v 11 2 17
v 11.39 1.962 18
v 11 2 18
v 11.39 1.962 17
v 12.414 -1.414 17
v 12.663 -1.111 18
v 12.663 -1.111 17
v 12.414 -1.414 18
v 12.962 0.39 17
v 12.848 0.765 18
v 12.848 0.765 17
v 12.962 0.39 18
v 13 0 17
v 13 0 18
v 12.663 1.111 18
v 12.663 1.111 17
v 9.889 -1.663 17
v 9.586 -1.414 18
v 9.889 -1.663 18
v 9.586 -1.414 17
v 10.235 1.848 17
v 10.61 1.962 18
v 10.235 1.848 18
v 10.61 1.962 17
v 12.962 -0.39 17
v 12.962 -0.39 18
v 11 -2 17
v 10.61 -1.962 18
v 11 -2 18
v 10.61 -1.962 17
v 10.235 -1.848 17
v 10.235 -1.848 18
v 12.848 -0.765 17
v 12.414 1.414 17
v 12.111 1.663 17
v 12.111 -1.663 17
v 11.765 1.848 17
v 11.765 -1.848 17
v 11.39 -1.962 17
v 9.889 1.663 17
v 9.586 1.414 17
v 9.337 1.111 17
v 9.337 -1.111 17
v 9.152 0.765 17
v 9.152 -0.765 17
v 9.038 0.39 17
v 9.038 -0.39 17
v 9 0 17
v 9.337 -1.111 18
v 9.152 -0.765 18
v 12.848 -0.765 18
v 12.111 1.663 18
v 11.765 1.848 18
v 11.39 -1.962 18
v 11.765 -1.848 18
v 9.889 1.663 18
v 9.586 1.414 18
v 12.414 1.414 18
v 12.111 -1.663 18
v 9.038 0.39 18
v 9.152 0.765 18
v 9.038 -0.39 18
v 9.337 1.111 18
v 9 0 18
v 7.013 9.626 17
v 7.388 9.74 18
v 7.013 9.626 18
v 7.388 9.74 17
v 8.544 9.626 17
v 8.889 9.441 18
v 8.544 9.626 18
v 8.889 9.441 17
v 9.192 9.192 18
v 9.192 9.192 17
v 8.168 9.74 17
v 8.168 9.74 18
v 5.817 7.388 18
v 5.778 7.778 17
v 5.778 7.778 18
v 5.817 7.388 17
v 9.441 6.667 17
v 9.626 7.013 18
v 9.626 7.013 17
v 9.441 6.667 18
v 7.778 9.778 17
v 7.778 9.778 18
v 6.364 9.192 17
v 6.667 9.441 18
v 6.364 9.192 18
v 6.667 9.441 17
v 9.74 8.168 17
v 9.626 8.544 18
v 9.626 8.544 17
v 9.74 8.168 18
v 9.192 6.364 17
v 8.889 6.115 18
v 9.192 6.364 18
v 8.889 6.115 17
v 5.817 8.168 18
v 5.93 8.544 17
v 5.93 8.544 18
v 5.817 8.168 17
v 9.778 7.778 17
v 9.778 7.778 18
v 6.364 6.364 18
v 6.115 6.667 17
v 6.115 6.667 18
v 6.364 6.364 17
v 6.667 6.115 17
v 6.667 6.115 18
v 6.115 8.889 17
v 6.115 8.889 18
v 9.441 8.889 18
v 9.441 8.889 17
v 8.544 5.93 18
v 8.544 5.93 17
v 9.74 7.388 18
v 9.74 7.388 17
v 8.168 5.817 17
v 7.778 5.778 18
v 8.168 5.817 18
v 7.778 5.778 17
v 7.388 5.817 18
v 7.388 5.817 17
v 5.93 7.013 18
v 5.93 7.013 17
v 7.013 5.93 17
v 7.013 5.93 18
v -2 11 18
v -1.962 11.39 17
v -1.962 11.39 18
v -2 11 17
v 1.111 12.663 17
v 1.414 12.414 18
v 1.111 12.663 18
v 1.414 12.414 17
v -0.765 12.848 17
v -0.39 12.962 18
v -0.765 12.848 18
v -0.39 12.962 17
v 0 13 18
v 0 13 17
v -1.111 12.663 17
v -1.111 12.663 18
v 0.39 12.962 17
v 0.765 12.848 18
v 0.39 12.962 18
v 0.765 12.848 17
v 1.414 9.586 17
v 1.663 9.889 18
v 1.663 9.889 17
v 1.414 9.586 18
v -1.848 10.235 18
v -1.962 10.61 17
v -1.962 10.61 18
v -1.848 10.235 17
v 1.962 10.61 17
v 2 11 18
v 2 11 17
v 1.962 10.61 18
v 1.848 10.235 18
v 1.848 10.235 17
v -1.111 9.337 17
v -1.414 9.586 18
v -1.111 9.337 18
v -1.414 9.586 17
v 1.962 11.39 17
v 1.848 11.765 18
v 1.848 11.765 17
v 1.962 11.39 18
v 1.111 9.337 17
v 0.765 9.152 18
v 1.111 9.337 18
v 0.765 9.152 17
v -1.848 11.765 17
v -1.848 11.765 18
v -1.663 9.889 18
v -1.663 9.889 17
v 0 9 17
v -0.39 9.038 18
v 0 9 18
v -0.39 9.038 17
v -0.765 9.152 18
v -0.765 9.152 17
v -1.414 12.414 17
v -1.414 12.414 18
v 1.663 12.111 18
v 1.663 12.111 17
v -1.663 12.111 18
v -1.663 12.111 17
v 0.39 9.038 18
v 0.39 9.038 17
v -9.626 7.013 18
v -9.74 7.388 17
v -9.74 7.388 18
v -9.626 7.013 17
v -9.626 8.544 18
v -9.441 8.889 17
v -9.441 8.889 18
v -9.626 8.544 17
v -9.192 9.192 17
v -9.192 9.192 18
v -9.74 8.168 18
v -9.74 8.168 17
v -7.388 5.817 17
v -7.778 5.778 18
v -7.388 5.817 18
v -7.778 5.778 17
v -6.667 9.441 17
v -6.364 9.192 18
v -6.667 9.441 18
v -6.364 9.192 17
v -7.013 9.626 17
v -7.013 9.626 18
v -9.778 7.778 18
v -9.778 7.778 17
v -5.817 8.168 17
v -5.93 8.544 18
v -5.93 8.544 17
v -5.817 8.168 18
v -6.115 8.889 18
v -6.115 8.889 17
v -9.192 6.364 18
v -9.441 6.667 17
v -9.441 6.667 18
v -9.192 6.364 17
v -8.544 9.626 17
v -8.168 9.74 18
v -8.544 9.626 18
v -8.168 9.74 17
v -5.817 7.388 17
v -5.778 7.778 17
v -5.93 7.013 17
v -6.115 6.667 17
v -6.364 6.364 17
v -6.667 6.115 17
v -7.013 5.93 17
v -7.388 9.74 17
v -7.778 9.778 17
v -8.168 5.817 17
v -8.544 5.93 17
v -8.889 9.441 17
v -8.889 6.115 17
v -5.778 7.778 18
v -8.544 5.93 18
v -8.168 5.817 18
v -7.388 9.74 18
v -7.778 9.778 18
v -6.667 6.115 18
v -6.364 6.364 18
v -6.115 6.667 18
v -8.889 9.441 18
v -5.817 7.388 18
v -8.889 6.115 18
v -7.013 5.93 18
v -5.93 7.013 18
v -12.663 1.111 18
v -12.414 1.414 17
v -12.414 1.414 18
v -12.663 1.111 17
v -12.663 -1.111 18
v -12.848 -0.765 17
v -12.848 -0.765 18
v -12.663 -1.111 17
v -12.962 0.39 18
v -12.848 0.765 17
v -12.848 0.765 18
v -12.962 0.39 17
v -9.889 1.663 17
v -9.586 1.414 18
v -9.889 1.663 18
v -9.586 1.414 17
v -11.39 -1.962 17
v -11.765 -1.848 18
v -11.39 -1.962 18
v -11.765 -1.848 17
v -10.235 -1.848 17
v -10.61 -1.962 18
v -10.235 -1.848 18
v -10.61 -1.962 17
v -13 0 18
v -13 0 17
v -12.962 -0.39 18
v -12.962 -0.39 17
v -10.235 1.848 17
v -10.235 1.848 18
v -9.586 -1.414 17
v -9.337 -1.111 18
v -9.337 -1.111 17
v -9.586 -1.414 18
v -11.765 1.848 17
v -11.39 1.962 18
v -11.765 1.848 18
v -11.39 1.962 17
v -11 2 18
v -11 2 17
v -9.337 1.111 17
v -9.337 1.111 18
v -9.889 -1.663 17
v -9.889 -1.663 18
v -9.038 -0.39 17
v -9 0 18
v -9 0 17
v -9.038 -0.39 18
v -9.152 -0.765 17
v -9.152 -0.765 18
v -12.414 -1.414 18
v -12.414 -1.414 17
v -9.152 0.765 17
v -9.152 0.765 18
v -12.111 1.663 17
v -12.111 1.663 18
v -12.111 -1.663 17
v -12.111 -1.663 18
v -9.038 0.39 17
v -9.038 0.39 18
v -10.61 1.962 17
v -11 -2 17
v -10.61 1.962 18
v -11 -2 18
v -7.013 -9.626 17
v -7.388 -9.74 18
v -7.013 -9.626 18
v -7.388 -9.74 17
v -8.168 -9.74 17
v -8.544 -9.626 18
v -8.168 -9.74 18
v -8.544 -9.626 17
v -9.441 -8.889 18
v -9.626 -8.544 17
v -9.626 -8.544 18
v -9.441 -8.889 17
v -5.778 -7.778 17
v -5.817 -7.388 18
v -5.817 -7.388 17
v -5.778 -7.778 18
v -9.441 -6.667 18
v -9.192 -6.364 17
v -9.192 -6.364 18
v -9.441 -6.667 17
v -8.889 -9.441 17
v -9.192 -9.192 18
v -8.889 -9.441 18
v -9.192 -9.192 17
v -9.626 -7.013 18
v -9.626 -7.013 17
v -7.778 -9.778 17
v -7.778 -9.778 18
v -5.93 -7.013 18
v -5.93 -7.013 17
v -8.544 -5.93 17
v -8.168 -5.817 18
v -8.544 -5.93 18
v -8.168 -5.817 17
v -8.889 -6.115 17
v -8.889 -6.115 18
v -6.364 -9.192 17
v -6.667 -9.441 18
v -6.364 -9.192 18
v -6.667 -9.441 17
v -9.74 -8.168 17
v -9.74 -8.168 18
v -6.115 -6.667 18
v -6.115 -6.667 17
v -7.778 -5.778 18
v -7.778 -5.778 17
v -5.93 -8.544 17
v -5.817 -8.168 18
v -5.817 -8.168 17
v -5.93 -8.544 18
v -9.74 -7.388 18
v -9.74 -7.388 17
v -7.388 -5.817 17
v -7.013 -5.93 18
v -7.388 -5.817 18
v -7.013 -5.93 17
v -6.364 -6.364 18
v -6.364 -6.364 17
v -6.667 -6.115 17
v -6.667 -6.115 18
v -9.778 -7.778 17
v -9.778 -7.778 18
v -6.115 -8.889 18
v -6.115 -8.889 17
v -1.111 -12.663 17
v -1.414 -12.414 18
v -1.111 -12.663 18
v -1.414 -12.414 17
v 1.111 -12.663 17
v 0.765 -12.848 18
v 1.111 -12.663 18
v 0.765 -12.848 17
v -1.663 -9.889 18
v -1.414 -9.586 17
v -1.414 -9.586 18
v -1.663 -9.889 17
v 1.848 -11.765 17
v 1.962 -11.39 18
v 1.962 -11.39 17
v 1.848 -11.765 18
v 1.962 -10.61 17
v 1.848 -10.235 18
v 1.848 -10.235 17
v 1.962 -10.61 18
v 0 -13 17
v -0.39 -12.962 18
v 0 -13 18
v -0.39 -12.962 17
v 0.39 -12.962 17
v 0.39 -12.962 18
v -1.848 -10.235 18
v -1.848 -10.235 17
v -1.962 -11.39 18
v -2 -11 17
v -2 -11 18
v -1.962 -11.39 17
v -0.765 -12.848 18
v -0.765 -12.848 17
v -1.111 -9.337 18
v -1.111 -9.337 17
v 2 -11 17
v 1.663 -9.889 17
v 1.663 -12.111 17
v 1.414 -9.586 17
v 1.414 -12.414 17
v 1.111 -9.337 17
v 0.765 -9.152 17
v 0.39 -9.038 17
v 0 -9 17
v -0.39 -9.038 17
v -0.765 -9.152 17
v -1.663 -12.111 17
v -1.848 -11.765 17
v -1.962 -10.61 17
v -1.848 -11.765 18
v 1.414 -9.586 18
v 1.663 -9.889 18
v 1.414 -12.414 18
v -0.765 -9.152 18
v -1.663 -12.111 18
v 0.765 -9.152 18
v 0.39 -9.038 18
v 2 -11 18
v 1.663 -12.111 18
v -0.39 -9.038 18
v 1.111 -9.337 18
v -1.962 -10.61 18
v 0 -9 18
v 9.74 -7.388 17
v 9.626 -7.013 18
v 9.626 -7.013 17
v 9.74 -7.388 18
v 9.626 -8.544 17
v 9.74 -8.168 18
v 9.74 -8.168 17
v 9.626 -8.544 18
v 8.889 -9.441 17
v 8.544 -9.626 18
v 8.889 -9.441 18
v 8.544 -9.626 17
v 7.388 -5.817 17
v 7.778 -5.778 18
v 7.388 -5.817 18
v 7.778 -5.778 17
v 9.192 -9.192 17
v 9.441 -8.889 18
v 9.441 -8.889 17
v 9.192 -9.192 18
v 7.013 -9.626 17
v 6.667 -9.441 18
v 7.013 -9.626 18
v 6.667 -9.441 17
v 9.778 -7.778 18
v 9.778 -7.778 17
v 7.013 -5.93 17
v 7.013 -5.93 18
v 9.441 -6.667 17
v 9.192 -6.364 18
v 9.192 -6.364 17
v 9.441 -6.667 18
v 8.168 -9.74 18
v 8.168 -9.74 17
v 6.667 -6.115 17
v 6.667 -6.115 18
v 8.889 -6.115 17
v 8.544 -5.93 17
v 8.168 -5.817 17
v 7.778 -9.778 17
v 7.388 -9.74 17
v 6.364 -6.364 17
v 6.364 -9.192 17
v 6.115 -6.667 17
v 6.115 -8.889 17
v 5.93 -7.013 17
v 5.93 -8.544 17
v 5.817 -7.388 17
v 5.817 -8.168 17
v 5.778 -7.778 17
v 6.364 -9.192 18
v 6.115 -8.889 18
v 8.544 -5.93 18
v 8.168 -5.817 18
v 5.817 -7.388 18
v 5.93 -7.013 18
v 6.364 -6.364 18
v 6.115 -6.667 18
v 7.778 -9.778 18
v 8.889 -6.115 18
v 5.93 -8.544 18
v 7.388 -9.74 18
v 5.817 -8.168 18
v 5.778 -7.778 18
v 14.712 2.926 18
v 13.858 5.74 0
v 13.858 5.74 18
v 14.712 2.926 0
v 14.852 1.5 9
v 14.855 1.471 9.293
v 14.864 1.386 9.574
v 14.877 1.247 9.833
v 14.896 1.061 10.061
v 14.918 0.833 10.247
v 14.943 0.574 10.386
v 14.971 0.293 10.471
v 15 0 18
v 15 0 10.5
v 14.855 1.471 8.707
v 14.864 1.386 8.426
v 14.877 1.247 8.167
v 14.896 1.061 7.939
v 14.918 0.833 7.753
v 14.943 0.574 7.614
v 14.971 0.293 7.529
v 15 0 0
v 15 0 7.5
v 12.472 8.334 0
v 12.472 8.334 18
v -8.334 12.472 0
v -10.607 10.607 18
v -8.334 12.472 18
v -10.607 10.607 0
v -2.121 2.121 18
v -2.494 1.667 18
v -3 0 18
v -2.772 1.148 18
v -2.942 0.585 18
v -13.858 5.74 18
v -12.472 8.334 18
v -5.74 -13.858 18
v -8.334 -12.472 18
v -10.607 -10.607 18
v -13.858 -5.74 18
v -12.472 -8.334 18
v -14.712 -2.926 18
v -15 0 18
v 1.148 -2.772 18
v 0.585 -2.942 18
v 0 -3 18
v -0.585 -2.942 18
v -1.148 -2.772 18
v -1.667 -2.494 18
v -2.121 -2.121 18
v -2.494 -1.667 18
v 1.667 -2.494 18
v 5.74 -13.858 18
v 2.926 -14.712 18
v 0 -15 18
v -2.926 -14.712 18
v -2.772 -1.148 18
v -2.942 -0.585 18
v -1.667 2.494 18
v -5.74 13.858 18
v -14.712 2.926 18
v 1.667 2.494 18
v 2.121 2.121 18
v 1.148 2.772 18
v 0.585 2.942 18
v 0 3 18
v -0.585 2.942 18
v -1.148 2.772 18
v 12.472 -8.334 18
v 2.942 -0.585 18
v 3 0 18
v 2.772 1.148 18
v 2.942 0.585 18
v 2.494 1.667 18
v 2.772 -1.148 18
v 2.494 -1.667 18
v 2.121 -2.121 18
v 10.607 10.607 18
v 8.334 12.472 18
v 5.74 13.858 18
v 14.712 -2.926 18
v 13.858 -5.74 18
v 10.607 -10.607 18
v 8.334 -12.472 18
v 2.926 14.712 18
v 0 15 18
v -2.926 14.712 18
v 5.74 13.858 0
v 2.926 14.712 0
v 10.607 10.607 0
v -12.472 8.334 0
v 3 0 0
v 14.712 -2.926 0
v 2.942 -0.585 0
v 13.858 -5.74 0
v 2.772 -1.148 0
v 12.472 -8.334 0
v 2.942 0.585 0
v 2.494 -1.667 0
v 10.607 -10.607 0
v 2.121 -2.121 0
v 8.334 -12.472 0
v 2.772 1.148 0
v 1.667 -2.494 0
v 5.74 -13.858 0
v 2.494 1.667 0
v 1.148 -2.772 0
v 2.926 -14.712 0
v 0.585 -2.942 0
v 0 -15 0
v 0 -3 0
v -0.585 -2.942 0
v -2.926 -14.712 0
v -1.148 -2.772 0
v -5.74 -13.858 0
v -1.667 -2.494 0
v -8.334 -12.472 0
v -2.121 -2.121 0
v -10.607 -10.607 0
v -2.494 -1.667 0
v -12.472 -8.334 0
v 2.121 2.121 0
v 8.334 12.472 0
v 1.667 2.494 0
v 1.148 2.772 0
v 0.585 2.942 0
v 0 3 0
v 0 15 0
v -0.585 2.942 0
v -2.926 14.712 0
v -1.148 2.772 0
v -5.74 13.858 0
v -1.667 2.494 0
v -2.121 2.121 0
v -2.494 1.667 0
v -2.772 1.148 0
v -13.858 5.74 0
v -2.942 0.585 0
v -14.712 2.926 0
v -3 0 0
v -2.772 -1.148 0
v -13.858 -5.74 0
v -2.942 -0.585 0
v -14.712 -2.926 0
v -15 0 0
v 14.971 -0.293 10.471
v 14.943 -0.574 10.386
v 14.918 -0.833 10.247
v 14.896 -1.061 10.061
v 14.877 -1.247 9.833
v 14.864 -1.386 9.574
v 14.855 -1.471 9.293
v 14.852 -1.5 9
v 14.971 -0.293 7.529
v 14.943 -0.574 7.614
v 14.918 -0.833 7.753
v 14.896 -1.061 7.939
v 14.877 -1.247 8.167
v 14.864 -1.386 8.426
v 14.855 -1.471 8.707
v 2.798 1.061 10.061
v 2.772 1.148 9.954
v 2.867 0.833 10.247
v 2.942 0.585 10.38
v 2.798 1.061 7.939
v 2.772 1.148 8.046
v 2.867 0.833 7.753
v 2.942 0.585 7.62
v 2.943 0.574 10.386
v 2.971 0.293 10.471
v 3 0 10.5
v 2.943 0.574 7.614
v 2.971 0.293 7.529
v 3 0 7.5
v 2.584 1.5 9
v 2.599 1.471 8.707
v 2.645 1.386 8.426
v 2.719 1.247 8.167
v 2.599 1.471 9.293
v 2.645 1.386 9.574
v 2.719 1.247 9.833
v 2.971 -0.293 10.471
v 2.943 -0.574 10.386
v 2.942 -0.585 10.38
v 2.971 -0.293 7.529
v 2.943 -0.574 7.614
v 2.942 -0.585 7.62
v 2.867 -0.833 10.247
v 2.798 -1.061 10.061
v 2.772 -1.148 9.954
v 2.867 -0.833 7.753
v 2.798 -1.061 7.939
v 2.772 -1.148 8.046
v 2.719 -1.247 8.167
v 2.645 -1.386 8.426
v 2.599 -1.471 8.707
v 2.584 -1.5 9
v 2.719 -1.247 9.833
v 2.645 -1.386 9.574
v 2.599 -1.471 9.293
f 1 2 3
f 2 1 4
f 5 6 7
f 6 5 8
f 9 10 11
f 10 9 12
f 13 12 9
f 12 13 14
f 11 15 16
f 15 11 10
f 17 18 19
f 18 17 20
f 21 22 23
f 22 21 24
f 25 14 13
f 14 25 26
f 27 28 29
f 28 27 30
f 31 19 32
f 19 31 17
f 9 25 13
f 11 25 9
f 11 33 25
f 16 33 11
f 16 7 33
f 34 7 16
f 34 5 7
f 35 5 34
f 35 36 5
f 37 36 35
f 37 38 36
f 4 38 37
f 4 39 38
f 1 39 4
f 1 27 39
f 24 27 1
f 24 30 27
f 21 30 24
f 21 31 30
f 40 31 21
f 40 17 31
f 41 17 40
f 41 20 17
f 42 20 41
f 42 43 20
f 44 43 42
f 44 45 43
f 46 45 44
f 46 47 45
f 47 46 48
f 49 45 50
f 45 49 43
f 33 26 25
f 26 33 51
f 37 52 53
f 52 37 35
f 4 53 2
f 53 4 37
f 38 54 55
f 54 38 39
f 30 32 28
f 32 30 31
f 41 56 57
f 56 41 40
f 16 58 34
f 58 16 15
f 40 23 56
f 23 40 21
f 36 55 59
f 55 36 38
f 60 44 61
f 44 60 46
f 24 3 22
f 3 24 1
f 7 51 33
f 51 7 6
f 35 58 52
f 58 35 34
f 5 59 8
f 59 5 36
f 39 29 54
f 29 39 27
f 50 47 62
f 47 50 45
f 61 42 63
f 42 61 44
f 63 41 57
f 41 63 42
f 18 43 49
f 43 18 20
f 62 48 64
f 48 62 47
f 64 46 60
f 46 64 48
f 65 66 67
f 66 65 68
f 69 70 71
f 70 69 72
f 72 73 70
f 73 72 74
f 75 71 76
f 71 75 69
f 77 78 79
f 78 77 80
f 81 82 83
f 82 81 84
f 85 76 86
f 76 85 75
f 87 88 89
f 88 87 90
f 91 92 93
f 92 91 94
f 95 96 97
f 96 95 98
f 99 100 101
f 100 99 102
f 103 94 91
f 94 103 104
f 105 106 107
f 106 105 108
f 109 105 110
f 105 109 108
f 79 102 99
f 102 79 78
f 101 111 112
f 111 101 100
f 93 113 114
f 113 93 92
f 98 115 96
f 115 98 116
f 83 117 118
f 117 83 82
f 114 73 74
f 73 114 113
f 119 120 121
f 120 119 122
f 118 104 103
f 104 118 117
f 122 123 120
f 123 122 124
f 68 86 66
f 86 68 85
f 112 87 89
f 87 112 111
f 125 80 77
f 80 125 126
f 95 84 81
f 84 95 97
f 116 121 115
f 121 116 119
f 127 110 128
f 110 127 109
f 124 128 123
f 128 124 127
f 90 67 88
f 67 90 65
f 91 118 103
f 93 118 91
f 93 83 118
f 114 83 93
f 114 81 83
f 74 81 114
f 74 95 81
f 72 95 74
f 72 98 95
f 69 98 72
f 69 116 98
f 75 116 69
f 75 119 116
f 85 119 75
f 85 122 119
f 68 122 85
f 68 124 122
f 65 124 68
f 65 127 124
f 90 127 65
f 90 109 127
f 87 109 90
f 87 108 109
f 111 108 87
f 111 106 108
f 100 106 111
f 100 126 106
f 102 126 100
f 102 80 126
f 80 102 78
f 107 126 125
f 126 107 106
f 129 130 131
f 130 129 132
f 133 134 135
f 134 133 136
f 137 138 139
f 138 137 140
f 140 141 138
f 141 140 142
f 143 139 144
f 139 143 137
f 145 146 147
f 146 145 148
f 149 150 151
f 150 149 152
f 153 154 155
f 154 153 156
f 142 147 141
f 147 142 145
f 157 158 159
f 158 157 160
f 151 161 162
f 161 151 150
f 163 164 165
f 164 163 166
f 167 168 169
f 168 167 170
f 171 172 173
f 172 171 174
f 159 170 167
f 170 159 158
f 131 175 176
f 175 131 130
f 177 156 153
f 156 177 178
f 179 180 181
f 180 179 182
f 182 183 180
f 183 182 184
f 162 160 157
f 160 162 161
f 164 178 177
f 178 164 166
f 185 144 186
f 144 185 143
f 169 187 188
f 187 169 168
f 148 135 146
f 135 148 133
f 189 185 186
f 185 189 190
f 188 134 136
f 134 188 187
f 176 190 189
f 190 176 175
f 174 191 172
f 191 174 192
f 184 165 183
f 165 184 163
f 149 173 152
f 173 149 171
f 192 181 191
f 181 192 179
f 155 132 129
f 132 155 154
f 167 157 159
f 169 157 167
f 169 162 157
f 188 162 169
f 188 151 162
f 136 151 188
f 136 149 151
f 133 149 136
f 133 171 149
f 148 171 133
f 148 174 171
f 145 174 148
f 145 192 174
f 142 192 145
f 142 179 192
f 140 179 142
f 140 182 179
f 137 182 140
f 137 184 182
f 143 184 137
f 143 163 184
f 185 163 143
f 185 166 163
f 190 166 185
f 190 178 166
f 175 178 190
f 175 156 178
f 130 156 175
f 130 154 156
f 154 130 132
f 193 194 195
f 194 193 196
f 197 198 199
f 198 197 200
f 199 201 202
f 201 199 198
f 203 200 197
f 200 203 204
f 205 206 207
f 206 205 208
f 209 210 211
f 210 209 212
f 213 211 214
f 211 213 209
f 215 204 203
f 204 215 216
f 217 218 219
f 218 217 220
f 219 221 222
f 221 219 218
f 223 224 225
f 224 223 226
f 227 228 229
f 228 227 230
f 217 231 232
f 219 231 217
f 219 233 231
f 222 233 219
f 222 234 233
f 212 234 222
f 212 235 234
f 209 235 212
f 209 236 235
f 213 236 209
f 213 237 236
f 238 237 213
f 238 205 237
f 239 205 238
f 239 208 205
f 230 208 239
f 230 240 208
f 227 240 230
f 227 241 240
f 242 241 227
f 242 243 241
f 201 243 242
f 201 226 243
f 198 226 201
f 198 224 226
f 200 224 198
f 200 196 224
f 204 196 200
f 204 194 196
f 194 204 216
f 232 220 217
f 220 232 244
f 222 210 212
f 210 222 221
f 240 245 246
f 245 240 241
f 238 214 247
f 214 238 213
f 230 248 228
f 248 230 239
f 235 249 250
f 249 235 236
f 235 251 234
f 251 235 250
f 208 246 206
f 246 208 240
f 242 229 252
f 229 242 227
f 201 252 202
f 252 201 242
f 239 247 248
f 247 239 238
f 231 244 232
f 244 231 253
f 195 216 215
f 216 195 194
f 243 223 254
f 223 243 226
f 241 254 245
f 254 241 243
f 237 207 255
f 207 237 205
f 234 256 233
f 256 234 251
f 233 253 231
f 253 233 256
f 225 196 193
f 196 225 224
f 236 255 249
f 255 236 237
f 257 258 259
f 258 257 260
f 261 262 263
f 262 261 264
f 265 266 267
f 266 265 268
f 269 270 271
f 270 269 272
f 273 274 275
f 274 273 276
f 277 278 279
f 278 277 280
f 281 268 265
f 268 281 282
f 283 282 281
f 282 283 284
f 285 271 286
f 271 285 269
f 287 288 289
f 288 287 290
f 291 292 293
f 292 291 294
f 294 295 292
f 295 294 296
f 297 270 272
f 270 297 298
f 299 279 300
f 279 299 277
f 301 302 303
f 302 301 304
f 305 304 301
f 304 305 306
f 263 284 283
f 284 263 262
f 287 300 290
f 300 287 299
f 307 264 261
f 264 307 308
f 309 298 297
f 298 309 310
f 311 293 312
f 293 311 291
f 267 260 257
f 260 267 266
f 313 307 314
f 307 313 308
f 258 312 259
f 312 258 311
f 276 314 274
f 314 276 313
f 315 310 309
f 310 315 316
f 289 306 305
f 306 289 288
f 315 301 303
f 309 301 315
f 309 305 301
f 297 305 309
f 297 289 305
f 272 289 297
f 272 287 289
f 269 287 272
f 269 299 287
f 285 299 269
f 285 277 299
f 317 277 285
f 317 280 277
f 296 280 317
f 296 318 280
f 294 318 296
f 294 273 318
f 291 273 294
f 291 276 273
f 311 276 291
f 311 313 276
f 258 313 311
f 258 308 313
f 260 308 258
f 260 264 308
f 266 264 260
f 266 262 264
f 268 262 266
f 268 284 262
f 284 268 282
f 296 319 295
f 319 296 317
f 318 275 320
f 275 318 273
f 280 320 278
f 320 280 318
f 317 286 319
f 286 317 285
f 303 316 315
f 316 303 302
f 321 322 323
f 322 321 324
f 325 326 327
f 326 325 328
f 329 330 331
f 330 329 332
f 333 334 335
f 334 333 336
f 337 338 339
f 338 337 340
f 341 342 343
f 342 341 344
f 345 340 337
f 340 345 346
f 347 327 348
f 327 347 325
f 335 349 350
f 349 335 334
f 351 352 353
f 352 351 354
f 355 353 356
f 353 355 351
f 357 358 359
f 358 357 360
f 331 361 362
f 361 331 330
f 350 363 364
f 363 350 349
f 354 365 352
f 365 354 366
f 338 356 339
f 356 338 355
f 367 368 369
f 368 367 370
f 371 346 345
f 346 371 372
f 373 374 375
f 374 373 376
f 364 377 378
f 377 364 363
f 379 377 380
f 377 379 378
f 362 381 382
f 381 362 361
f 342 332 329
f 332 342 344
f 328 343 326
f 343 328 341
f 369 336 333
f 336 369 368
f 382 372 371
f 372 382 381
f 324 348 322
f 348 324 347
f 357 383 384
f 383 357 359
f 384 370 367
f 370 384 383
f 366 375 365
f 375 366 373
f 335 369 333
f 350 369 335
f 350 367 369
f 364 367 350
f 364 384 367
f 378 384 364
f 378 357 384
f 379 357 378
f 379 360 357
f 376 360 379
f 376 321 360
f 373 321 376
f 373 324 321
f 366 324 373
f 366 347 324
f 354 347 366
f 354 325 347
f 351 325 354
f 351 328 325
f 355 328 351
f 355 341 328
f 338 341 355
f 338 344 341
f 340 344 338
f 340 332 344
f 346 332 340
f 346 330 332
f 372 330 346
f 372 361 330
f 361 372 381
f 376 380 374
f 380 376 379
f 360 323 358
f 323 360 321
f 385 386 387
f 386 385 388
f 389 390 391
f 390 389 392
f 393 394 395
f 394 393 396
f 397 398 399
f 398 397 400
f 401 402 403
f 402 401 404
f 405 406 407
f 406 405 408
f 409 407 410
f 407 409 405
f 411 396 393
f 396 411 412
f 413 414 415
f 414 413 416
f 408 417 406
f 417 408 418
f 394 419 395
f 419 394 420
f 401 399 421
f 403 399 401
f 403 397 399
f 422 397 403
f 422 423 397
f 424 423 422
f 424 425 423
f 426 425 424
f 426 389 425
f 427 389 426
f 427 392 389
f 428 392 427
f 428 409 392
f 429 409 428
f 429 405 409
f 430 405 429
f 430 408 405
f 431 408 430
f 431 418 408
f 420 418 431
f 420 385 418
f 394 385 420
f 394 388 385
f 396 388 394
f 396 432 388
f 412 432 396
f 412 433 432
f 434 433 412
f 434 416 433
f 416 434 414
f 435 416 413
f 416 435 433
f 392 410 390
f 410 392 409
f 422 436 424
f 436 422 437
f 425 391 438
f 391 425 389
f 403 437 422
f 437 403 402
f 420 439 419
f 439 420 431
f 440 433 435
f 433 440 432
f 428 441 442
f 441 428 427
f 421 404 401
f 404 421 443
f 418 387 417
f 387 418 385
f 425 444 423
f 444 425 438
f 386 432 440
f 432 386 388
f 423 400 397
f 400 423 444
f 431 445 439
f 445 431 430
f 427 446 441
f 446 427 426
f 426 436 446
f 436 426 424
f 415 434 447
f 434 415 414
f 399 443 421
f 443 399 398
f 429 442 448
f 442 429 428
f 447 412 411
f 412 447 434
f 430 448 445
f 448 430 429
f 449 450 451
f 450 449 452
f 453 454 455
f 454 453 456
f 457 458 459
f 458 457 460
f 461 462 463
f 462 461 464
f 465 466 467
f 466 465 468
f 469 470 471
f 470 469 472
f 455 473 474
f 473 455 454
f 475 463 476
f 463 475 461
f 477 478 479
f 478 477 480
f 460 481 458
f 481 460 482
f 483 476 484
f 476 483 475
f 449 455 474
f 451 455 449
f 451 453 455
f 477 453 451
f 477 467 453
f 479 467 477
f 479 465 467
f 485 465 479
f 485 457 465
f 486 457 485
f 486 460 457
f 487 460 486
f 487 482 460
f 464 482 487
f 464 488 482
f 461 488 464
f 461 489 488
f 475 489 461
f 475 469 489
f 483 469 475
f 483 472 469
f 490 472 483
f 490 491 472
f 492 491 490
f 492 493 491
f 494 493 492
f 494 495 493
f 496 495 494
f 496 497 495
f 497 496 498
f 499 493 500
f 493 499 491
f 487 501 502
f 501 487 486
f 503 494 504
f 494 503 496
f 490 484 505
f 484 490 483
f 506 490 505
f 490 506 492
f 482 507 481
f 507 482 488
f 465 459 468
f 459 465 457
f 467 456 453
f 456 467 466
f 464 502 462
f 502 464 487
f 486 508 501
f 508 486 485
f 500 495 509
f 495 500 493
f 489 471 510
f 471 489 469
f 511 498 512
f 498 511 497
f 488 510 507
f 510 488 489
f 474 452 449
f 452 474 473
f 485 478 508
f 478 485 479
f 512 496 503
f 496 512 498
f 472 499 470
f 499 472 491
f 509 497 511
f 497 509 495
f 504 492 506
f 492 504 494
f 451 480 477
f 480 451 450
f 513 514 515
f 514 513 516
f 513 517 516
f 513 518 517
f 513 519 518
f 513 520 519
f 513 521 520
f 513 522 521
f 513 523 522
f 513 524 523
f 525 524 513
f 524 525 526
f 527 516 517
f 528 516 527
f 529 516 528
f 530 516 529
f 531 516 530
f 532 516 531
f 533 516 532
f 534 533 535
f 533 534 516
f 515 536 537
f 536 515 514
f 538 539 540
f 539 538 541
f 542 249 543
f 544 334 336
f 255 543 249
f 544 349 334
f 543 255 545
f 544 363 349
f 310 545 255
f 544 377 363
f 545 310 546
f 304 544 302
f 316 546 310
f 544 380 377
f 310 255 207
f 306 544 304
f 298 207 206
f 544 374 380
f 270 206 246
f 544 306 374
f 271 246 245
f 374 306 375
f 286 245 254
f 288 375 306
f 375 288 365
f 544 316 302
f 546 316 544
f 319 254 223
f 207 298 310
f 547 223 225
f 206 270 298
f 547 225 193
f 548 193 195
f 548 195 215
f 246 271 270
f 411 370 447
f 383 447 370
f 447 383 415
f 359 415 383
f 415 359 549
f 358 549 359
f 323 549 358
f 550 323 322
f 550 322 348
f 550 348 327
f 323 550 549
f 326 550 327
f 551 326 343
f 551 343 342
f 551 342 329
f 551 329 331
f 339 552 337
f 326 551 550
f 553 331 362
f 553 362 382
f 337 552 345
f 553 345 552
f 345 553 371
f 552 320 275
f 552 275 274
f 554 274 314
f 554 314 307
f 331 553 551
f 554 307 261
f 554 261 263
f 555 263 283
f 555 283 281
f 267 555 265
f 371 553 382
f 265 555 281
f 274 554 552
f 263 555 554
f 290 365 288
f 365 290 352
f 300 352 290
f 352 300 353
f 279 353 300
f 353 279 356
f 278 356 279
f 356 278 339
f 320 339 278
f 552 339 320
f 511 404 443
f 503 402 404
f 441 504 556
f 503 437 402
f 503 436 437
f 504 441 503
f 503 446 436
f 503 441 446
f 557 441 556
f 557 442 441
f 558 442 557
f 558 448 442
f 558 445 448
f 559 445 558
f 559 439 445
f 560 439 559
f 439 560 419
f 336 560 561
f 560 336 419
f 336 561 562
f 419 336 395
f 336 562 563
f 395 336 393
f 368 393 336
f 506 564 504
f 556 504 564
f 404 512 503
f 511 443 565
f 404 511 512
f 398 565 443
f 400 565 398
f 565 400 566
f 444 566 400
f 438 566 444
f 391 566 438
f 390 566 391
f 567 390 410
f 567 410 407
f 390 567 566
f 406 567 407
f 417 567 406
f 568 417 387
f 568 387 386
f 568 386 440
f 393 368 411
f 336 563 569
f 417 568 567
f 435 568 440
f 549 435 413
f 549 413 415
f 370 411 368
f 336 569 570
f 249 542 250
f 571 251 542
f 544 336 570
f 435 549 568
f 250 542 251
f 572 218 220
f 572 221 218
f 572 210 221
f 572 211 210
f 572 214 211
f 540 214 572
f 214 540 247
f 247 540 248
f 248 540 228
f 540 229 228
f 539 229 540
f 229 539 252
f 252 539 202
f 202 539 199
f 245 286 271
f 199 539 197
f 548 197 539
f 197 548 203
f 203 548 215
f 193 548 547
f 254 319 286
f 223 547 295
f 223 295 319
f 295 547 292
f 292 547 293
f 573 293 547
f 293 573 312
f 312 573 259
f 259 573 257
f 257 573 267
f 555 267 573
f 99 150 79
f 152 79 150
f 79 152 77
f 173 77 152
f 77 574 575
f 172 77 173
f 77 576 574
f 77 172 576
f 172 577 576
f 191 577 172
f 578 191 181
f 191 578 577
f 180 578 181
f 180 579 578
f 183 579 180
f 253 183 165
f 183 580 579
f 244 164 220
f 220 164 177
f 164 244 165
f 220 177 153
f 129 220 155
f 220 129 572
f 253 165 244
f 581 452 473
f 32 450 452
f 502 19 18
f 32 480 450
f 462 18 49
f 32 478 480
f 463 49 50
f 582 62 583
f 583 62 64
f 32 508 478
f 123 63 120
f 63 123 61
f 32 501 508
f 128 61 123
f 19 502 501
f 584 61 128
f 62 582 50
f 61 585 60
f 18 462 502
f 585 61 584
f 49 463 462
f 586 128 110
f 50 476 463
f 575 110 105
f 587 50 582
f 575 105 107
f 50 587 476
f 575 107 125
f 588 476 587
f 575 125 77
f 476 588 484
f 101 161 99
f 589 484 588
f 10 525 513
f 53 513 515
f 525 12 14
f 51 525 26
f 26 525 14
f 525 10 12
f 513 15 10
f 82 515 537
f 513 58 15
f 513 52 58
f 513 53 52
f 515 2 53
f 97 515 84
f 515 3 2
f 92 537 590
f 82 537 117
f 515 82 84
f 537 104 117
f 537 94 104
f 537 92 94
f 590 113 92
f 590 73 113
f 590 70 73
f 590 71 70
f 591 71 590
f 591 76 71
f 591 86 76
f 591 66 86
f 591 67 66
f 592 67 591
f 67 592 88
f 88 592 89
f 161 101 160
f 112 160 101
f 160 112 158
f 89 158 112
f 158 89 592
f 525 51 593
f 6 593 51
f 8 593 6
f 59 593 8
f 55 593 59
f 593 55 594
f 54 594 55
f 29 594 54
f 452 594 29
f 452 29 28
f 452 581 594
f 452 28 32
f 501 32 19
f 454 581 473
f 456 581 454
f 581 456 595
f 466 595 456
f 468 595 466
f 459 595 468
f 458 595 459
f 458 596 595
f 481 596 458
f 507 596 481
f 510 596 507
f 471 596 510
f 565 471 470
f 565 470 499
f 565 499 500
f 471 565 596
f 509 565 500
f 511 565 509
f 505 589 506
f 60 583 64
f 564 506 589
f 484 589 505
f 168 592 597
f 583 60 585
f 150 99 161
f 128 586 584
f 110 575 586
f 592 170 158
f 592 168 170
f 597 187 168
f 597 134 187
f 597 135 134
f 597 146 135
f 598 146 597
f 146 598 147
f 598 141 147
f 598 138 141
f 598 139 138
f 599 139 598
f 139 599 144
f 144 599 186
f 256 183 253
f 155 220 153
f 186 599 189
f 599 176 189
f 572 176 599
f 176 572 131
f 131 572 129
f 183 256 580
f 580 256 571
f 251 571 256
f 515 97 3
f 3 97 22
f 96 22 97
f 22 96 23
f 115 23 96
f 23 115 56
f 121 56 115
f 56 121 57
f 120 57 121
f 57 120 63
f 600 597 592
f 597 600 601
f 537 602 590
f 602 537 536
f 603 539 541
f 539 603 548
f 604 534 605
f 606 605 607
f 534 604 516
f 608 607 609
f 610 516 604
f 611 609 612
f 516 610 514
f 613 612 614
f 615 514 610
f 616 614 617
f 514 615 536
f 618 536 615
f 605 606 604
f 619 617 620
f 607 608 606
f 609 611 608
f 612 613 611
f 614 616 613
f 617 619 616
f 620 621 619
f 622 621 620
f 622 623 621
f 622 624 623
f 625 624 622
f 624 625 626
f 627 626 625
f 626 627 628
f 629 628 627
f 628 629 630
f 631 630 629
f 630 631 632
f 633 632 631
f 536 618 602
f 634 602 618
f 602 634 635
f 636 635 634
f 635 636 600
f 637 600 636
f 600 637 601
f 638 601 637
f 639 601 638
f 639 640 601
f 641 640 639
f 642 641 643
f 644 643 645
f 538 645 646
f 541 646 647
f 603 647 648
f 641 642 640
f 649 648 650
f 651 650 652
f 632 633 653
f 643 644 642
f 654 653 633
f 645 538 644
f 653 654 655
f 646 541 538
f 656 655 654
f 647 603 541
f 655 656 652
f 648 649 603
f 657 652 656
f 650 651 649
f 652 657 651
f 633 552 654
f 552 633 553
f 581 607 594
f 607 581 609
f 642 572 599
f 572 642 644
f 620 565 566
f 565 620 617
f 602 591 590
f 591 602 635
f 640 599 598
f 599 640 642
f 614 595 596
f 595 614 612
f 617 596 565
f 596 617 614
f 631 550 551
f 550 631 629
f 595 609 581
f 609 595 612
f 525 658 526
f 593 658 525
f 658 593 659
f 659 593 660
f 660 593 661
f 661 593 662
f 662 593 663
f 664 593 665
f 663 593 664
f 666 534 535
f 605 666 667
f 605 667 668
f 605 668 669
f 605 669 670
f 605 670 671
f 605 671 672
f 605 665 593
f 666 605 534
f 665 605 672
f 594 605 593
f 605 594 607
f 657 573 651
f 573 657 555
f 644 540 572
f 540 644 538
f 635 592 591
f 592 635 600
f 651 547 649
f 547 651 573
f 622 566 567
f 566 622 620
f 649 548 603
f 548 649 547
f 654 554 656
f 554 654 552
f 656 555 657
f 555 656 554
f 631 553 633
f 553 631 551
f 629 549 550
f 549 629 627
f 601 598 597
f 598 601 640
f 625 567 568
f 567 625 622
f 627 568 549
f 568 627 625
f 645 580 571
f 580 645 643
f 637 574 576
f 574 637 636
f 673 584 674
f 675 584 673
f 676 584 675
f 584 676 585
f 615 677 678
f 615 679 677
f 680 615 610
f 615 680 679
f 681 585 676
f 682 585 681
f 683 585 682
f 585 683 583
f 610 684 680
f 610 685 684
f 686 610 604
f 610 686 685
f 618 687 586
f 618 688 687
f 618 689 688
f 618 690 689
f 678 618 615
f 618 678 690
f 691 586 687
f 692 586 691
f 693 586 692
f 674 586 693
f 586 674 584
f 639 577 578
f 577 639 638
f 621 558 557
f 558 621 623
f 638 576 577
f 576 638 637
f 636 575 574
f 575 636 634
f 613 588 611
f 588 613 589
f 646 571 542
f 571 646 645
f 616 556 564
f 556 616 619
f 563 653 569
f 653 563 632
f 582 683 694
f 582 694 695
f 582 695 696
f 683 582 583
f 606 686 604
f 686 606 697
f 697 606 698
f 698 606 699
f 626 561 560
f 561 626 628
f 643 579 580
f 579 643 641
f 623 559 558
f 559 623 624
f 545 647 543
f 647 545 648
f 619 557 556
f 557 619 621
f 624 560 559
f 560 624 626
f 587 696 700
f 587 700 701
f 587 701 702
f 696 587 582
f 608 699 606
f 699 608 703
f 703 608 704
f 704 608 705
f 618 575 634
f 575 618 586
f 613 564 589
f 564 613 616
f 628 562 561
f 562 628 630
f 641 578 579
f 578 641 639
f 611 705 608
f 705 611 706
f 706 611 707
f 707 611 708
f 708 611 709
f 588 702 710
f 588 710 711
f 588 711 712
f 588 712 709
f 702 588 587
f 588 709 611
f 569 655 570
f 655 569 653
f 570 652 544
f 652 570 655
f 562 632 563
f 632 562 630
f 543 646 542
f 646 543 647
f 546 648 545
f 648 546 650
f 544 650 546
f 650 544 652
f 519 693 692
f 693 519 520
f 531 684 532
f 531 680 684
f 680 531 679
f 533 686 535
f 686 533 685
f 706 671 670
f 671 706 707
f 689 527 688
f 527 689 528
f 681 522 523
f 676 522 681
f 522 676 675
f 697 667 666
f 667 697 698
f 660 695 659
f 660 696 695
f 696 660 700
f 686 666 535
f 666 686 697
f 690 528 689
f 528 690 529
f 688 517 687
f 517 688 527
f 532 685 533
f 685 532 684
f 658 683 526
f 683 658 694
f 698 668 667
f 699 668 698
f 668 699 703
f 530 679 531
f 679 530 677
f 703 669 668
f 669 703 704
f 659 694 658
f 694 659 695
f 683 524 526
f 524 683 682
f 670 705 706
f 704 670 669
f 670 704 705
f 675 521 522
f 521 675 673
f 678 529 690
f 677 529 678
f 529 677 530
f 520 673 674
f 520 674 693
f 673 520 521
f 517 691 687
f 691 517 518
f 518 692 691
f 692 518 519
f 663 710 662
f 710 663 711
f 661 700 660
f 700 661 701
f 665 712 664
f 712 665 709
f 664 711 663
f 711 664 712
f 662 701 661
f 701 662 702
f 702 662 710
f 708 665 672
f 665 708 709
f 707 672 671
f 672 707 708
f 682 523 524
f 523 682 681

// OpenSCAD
$fn = 32;

// ----------------------------------------------------------------------
// Control knob: dimpled knob
// ----------------------------------------------------------------------

// --- parameters (mm) ---
dimp_d = 4;               // finger dimple diameter
n_dimp = 8;               // number of dimples
dimp_r = 11;              // dimple ring radius
knob_d = 30;              // knob body diameter
knob_h = 18;              // knob body height
bore_d = 6;               // shaft bore diameter
set_d = 3;                // set screw bore diameter
fit_tol = 0.1;            // tolerance for press fits, mm
free_tol = 0.5;           // tolerance for clearance fits, mm

dimp_step = 360 / n_dimp;  // dimple angular step

difference() {
  cylinder(h = knob_h, d = knob_d);
  translate([0, 0, -1]) cylinder(h = knob_h + 2, d = bore_d);
  translate([-1, 0, knob_h / 2]) rotate([0, 90, 0])
    cylinder(h = knob_d / 2 + bore_d / 2 + 2, d = set_d);  for (i = [0 : n_dimp - 1])
    rotate([0, 0, i * dimp_step])
      translate([dimp_r, 0, knob_h - 1])
        cylinder(h = 2, d = dimp_d);
}
